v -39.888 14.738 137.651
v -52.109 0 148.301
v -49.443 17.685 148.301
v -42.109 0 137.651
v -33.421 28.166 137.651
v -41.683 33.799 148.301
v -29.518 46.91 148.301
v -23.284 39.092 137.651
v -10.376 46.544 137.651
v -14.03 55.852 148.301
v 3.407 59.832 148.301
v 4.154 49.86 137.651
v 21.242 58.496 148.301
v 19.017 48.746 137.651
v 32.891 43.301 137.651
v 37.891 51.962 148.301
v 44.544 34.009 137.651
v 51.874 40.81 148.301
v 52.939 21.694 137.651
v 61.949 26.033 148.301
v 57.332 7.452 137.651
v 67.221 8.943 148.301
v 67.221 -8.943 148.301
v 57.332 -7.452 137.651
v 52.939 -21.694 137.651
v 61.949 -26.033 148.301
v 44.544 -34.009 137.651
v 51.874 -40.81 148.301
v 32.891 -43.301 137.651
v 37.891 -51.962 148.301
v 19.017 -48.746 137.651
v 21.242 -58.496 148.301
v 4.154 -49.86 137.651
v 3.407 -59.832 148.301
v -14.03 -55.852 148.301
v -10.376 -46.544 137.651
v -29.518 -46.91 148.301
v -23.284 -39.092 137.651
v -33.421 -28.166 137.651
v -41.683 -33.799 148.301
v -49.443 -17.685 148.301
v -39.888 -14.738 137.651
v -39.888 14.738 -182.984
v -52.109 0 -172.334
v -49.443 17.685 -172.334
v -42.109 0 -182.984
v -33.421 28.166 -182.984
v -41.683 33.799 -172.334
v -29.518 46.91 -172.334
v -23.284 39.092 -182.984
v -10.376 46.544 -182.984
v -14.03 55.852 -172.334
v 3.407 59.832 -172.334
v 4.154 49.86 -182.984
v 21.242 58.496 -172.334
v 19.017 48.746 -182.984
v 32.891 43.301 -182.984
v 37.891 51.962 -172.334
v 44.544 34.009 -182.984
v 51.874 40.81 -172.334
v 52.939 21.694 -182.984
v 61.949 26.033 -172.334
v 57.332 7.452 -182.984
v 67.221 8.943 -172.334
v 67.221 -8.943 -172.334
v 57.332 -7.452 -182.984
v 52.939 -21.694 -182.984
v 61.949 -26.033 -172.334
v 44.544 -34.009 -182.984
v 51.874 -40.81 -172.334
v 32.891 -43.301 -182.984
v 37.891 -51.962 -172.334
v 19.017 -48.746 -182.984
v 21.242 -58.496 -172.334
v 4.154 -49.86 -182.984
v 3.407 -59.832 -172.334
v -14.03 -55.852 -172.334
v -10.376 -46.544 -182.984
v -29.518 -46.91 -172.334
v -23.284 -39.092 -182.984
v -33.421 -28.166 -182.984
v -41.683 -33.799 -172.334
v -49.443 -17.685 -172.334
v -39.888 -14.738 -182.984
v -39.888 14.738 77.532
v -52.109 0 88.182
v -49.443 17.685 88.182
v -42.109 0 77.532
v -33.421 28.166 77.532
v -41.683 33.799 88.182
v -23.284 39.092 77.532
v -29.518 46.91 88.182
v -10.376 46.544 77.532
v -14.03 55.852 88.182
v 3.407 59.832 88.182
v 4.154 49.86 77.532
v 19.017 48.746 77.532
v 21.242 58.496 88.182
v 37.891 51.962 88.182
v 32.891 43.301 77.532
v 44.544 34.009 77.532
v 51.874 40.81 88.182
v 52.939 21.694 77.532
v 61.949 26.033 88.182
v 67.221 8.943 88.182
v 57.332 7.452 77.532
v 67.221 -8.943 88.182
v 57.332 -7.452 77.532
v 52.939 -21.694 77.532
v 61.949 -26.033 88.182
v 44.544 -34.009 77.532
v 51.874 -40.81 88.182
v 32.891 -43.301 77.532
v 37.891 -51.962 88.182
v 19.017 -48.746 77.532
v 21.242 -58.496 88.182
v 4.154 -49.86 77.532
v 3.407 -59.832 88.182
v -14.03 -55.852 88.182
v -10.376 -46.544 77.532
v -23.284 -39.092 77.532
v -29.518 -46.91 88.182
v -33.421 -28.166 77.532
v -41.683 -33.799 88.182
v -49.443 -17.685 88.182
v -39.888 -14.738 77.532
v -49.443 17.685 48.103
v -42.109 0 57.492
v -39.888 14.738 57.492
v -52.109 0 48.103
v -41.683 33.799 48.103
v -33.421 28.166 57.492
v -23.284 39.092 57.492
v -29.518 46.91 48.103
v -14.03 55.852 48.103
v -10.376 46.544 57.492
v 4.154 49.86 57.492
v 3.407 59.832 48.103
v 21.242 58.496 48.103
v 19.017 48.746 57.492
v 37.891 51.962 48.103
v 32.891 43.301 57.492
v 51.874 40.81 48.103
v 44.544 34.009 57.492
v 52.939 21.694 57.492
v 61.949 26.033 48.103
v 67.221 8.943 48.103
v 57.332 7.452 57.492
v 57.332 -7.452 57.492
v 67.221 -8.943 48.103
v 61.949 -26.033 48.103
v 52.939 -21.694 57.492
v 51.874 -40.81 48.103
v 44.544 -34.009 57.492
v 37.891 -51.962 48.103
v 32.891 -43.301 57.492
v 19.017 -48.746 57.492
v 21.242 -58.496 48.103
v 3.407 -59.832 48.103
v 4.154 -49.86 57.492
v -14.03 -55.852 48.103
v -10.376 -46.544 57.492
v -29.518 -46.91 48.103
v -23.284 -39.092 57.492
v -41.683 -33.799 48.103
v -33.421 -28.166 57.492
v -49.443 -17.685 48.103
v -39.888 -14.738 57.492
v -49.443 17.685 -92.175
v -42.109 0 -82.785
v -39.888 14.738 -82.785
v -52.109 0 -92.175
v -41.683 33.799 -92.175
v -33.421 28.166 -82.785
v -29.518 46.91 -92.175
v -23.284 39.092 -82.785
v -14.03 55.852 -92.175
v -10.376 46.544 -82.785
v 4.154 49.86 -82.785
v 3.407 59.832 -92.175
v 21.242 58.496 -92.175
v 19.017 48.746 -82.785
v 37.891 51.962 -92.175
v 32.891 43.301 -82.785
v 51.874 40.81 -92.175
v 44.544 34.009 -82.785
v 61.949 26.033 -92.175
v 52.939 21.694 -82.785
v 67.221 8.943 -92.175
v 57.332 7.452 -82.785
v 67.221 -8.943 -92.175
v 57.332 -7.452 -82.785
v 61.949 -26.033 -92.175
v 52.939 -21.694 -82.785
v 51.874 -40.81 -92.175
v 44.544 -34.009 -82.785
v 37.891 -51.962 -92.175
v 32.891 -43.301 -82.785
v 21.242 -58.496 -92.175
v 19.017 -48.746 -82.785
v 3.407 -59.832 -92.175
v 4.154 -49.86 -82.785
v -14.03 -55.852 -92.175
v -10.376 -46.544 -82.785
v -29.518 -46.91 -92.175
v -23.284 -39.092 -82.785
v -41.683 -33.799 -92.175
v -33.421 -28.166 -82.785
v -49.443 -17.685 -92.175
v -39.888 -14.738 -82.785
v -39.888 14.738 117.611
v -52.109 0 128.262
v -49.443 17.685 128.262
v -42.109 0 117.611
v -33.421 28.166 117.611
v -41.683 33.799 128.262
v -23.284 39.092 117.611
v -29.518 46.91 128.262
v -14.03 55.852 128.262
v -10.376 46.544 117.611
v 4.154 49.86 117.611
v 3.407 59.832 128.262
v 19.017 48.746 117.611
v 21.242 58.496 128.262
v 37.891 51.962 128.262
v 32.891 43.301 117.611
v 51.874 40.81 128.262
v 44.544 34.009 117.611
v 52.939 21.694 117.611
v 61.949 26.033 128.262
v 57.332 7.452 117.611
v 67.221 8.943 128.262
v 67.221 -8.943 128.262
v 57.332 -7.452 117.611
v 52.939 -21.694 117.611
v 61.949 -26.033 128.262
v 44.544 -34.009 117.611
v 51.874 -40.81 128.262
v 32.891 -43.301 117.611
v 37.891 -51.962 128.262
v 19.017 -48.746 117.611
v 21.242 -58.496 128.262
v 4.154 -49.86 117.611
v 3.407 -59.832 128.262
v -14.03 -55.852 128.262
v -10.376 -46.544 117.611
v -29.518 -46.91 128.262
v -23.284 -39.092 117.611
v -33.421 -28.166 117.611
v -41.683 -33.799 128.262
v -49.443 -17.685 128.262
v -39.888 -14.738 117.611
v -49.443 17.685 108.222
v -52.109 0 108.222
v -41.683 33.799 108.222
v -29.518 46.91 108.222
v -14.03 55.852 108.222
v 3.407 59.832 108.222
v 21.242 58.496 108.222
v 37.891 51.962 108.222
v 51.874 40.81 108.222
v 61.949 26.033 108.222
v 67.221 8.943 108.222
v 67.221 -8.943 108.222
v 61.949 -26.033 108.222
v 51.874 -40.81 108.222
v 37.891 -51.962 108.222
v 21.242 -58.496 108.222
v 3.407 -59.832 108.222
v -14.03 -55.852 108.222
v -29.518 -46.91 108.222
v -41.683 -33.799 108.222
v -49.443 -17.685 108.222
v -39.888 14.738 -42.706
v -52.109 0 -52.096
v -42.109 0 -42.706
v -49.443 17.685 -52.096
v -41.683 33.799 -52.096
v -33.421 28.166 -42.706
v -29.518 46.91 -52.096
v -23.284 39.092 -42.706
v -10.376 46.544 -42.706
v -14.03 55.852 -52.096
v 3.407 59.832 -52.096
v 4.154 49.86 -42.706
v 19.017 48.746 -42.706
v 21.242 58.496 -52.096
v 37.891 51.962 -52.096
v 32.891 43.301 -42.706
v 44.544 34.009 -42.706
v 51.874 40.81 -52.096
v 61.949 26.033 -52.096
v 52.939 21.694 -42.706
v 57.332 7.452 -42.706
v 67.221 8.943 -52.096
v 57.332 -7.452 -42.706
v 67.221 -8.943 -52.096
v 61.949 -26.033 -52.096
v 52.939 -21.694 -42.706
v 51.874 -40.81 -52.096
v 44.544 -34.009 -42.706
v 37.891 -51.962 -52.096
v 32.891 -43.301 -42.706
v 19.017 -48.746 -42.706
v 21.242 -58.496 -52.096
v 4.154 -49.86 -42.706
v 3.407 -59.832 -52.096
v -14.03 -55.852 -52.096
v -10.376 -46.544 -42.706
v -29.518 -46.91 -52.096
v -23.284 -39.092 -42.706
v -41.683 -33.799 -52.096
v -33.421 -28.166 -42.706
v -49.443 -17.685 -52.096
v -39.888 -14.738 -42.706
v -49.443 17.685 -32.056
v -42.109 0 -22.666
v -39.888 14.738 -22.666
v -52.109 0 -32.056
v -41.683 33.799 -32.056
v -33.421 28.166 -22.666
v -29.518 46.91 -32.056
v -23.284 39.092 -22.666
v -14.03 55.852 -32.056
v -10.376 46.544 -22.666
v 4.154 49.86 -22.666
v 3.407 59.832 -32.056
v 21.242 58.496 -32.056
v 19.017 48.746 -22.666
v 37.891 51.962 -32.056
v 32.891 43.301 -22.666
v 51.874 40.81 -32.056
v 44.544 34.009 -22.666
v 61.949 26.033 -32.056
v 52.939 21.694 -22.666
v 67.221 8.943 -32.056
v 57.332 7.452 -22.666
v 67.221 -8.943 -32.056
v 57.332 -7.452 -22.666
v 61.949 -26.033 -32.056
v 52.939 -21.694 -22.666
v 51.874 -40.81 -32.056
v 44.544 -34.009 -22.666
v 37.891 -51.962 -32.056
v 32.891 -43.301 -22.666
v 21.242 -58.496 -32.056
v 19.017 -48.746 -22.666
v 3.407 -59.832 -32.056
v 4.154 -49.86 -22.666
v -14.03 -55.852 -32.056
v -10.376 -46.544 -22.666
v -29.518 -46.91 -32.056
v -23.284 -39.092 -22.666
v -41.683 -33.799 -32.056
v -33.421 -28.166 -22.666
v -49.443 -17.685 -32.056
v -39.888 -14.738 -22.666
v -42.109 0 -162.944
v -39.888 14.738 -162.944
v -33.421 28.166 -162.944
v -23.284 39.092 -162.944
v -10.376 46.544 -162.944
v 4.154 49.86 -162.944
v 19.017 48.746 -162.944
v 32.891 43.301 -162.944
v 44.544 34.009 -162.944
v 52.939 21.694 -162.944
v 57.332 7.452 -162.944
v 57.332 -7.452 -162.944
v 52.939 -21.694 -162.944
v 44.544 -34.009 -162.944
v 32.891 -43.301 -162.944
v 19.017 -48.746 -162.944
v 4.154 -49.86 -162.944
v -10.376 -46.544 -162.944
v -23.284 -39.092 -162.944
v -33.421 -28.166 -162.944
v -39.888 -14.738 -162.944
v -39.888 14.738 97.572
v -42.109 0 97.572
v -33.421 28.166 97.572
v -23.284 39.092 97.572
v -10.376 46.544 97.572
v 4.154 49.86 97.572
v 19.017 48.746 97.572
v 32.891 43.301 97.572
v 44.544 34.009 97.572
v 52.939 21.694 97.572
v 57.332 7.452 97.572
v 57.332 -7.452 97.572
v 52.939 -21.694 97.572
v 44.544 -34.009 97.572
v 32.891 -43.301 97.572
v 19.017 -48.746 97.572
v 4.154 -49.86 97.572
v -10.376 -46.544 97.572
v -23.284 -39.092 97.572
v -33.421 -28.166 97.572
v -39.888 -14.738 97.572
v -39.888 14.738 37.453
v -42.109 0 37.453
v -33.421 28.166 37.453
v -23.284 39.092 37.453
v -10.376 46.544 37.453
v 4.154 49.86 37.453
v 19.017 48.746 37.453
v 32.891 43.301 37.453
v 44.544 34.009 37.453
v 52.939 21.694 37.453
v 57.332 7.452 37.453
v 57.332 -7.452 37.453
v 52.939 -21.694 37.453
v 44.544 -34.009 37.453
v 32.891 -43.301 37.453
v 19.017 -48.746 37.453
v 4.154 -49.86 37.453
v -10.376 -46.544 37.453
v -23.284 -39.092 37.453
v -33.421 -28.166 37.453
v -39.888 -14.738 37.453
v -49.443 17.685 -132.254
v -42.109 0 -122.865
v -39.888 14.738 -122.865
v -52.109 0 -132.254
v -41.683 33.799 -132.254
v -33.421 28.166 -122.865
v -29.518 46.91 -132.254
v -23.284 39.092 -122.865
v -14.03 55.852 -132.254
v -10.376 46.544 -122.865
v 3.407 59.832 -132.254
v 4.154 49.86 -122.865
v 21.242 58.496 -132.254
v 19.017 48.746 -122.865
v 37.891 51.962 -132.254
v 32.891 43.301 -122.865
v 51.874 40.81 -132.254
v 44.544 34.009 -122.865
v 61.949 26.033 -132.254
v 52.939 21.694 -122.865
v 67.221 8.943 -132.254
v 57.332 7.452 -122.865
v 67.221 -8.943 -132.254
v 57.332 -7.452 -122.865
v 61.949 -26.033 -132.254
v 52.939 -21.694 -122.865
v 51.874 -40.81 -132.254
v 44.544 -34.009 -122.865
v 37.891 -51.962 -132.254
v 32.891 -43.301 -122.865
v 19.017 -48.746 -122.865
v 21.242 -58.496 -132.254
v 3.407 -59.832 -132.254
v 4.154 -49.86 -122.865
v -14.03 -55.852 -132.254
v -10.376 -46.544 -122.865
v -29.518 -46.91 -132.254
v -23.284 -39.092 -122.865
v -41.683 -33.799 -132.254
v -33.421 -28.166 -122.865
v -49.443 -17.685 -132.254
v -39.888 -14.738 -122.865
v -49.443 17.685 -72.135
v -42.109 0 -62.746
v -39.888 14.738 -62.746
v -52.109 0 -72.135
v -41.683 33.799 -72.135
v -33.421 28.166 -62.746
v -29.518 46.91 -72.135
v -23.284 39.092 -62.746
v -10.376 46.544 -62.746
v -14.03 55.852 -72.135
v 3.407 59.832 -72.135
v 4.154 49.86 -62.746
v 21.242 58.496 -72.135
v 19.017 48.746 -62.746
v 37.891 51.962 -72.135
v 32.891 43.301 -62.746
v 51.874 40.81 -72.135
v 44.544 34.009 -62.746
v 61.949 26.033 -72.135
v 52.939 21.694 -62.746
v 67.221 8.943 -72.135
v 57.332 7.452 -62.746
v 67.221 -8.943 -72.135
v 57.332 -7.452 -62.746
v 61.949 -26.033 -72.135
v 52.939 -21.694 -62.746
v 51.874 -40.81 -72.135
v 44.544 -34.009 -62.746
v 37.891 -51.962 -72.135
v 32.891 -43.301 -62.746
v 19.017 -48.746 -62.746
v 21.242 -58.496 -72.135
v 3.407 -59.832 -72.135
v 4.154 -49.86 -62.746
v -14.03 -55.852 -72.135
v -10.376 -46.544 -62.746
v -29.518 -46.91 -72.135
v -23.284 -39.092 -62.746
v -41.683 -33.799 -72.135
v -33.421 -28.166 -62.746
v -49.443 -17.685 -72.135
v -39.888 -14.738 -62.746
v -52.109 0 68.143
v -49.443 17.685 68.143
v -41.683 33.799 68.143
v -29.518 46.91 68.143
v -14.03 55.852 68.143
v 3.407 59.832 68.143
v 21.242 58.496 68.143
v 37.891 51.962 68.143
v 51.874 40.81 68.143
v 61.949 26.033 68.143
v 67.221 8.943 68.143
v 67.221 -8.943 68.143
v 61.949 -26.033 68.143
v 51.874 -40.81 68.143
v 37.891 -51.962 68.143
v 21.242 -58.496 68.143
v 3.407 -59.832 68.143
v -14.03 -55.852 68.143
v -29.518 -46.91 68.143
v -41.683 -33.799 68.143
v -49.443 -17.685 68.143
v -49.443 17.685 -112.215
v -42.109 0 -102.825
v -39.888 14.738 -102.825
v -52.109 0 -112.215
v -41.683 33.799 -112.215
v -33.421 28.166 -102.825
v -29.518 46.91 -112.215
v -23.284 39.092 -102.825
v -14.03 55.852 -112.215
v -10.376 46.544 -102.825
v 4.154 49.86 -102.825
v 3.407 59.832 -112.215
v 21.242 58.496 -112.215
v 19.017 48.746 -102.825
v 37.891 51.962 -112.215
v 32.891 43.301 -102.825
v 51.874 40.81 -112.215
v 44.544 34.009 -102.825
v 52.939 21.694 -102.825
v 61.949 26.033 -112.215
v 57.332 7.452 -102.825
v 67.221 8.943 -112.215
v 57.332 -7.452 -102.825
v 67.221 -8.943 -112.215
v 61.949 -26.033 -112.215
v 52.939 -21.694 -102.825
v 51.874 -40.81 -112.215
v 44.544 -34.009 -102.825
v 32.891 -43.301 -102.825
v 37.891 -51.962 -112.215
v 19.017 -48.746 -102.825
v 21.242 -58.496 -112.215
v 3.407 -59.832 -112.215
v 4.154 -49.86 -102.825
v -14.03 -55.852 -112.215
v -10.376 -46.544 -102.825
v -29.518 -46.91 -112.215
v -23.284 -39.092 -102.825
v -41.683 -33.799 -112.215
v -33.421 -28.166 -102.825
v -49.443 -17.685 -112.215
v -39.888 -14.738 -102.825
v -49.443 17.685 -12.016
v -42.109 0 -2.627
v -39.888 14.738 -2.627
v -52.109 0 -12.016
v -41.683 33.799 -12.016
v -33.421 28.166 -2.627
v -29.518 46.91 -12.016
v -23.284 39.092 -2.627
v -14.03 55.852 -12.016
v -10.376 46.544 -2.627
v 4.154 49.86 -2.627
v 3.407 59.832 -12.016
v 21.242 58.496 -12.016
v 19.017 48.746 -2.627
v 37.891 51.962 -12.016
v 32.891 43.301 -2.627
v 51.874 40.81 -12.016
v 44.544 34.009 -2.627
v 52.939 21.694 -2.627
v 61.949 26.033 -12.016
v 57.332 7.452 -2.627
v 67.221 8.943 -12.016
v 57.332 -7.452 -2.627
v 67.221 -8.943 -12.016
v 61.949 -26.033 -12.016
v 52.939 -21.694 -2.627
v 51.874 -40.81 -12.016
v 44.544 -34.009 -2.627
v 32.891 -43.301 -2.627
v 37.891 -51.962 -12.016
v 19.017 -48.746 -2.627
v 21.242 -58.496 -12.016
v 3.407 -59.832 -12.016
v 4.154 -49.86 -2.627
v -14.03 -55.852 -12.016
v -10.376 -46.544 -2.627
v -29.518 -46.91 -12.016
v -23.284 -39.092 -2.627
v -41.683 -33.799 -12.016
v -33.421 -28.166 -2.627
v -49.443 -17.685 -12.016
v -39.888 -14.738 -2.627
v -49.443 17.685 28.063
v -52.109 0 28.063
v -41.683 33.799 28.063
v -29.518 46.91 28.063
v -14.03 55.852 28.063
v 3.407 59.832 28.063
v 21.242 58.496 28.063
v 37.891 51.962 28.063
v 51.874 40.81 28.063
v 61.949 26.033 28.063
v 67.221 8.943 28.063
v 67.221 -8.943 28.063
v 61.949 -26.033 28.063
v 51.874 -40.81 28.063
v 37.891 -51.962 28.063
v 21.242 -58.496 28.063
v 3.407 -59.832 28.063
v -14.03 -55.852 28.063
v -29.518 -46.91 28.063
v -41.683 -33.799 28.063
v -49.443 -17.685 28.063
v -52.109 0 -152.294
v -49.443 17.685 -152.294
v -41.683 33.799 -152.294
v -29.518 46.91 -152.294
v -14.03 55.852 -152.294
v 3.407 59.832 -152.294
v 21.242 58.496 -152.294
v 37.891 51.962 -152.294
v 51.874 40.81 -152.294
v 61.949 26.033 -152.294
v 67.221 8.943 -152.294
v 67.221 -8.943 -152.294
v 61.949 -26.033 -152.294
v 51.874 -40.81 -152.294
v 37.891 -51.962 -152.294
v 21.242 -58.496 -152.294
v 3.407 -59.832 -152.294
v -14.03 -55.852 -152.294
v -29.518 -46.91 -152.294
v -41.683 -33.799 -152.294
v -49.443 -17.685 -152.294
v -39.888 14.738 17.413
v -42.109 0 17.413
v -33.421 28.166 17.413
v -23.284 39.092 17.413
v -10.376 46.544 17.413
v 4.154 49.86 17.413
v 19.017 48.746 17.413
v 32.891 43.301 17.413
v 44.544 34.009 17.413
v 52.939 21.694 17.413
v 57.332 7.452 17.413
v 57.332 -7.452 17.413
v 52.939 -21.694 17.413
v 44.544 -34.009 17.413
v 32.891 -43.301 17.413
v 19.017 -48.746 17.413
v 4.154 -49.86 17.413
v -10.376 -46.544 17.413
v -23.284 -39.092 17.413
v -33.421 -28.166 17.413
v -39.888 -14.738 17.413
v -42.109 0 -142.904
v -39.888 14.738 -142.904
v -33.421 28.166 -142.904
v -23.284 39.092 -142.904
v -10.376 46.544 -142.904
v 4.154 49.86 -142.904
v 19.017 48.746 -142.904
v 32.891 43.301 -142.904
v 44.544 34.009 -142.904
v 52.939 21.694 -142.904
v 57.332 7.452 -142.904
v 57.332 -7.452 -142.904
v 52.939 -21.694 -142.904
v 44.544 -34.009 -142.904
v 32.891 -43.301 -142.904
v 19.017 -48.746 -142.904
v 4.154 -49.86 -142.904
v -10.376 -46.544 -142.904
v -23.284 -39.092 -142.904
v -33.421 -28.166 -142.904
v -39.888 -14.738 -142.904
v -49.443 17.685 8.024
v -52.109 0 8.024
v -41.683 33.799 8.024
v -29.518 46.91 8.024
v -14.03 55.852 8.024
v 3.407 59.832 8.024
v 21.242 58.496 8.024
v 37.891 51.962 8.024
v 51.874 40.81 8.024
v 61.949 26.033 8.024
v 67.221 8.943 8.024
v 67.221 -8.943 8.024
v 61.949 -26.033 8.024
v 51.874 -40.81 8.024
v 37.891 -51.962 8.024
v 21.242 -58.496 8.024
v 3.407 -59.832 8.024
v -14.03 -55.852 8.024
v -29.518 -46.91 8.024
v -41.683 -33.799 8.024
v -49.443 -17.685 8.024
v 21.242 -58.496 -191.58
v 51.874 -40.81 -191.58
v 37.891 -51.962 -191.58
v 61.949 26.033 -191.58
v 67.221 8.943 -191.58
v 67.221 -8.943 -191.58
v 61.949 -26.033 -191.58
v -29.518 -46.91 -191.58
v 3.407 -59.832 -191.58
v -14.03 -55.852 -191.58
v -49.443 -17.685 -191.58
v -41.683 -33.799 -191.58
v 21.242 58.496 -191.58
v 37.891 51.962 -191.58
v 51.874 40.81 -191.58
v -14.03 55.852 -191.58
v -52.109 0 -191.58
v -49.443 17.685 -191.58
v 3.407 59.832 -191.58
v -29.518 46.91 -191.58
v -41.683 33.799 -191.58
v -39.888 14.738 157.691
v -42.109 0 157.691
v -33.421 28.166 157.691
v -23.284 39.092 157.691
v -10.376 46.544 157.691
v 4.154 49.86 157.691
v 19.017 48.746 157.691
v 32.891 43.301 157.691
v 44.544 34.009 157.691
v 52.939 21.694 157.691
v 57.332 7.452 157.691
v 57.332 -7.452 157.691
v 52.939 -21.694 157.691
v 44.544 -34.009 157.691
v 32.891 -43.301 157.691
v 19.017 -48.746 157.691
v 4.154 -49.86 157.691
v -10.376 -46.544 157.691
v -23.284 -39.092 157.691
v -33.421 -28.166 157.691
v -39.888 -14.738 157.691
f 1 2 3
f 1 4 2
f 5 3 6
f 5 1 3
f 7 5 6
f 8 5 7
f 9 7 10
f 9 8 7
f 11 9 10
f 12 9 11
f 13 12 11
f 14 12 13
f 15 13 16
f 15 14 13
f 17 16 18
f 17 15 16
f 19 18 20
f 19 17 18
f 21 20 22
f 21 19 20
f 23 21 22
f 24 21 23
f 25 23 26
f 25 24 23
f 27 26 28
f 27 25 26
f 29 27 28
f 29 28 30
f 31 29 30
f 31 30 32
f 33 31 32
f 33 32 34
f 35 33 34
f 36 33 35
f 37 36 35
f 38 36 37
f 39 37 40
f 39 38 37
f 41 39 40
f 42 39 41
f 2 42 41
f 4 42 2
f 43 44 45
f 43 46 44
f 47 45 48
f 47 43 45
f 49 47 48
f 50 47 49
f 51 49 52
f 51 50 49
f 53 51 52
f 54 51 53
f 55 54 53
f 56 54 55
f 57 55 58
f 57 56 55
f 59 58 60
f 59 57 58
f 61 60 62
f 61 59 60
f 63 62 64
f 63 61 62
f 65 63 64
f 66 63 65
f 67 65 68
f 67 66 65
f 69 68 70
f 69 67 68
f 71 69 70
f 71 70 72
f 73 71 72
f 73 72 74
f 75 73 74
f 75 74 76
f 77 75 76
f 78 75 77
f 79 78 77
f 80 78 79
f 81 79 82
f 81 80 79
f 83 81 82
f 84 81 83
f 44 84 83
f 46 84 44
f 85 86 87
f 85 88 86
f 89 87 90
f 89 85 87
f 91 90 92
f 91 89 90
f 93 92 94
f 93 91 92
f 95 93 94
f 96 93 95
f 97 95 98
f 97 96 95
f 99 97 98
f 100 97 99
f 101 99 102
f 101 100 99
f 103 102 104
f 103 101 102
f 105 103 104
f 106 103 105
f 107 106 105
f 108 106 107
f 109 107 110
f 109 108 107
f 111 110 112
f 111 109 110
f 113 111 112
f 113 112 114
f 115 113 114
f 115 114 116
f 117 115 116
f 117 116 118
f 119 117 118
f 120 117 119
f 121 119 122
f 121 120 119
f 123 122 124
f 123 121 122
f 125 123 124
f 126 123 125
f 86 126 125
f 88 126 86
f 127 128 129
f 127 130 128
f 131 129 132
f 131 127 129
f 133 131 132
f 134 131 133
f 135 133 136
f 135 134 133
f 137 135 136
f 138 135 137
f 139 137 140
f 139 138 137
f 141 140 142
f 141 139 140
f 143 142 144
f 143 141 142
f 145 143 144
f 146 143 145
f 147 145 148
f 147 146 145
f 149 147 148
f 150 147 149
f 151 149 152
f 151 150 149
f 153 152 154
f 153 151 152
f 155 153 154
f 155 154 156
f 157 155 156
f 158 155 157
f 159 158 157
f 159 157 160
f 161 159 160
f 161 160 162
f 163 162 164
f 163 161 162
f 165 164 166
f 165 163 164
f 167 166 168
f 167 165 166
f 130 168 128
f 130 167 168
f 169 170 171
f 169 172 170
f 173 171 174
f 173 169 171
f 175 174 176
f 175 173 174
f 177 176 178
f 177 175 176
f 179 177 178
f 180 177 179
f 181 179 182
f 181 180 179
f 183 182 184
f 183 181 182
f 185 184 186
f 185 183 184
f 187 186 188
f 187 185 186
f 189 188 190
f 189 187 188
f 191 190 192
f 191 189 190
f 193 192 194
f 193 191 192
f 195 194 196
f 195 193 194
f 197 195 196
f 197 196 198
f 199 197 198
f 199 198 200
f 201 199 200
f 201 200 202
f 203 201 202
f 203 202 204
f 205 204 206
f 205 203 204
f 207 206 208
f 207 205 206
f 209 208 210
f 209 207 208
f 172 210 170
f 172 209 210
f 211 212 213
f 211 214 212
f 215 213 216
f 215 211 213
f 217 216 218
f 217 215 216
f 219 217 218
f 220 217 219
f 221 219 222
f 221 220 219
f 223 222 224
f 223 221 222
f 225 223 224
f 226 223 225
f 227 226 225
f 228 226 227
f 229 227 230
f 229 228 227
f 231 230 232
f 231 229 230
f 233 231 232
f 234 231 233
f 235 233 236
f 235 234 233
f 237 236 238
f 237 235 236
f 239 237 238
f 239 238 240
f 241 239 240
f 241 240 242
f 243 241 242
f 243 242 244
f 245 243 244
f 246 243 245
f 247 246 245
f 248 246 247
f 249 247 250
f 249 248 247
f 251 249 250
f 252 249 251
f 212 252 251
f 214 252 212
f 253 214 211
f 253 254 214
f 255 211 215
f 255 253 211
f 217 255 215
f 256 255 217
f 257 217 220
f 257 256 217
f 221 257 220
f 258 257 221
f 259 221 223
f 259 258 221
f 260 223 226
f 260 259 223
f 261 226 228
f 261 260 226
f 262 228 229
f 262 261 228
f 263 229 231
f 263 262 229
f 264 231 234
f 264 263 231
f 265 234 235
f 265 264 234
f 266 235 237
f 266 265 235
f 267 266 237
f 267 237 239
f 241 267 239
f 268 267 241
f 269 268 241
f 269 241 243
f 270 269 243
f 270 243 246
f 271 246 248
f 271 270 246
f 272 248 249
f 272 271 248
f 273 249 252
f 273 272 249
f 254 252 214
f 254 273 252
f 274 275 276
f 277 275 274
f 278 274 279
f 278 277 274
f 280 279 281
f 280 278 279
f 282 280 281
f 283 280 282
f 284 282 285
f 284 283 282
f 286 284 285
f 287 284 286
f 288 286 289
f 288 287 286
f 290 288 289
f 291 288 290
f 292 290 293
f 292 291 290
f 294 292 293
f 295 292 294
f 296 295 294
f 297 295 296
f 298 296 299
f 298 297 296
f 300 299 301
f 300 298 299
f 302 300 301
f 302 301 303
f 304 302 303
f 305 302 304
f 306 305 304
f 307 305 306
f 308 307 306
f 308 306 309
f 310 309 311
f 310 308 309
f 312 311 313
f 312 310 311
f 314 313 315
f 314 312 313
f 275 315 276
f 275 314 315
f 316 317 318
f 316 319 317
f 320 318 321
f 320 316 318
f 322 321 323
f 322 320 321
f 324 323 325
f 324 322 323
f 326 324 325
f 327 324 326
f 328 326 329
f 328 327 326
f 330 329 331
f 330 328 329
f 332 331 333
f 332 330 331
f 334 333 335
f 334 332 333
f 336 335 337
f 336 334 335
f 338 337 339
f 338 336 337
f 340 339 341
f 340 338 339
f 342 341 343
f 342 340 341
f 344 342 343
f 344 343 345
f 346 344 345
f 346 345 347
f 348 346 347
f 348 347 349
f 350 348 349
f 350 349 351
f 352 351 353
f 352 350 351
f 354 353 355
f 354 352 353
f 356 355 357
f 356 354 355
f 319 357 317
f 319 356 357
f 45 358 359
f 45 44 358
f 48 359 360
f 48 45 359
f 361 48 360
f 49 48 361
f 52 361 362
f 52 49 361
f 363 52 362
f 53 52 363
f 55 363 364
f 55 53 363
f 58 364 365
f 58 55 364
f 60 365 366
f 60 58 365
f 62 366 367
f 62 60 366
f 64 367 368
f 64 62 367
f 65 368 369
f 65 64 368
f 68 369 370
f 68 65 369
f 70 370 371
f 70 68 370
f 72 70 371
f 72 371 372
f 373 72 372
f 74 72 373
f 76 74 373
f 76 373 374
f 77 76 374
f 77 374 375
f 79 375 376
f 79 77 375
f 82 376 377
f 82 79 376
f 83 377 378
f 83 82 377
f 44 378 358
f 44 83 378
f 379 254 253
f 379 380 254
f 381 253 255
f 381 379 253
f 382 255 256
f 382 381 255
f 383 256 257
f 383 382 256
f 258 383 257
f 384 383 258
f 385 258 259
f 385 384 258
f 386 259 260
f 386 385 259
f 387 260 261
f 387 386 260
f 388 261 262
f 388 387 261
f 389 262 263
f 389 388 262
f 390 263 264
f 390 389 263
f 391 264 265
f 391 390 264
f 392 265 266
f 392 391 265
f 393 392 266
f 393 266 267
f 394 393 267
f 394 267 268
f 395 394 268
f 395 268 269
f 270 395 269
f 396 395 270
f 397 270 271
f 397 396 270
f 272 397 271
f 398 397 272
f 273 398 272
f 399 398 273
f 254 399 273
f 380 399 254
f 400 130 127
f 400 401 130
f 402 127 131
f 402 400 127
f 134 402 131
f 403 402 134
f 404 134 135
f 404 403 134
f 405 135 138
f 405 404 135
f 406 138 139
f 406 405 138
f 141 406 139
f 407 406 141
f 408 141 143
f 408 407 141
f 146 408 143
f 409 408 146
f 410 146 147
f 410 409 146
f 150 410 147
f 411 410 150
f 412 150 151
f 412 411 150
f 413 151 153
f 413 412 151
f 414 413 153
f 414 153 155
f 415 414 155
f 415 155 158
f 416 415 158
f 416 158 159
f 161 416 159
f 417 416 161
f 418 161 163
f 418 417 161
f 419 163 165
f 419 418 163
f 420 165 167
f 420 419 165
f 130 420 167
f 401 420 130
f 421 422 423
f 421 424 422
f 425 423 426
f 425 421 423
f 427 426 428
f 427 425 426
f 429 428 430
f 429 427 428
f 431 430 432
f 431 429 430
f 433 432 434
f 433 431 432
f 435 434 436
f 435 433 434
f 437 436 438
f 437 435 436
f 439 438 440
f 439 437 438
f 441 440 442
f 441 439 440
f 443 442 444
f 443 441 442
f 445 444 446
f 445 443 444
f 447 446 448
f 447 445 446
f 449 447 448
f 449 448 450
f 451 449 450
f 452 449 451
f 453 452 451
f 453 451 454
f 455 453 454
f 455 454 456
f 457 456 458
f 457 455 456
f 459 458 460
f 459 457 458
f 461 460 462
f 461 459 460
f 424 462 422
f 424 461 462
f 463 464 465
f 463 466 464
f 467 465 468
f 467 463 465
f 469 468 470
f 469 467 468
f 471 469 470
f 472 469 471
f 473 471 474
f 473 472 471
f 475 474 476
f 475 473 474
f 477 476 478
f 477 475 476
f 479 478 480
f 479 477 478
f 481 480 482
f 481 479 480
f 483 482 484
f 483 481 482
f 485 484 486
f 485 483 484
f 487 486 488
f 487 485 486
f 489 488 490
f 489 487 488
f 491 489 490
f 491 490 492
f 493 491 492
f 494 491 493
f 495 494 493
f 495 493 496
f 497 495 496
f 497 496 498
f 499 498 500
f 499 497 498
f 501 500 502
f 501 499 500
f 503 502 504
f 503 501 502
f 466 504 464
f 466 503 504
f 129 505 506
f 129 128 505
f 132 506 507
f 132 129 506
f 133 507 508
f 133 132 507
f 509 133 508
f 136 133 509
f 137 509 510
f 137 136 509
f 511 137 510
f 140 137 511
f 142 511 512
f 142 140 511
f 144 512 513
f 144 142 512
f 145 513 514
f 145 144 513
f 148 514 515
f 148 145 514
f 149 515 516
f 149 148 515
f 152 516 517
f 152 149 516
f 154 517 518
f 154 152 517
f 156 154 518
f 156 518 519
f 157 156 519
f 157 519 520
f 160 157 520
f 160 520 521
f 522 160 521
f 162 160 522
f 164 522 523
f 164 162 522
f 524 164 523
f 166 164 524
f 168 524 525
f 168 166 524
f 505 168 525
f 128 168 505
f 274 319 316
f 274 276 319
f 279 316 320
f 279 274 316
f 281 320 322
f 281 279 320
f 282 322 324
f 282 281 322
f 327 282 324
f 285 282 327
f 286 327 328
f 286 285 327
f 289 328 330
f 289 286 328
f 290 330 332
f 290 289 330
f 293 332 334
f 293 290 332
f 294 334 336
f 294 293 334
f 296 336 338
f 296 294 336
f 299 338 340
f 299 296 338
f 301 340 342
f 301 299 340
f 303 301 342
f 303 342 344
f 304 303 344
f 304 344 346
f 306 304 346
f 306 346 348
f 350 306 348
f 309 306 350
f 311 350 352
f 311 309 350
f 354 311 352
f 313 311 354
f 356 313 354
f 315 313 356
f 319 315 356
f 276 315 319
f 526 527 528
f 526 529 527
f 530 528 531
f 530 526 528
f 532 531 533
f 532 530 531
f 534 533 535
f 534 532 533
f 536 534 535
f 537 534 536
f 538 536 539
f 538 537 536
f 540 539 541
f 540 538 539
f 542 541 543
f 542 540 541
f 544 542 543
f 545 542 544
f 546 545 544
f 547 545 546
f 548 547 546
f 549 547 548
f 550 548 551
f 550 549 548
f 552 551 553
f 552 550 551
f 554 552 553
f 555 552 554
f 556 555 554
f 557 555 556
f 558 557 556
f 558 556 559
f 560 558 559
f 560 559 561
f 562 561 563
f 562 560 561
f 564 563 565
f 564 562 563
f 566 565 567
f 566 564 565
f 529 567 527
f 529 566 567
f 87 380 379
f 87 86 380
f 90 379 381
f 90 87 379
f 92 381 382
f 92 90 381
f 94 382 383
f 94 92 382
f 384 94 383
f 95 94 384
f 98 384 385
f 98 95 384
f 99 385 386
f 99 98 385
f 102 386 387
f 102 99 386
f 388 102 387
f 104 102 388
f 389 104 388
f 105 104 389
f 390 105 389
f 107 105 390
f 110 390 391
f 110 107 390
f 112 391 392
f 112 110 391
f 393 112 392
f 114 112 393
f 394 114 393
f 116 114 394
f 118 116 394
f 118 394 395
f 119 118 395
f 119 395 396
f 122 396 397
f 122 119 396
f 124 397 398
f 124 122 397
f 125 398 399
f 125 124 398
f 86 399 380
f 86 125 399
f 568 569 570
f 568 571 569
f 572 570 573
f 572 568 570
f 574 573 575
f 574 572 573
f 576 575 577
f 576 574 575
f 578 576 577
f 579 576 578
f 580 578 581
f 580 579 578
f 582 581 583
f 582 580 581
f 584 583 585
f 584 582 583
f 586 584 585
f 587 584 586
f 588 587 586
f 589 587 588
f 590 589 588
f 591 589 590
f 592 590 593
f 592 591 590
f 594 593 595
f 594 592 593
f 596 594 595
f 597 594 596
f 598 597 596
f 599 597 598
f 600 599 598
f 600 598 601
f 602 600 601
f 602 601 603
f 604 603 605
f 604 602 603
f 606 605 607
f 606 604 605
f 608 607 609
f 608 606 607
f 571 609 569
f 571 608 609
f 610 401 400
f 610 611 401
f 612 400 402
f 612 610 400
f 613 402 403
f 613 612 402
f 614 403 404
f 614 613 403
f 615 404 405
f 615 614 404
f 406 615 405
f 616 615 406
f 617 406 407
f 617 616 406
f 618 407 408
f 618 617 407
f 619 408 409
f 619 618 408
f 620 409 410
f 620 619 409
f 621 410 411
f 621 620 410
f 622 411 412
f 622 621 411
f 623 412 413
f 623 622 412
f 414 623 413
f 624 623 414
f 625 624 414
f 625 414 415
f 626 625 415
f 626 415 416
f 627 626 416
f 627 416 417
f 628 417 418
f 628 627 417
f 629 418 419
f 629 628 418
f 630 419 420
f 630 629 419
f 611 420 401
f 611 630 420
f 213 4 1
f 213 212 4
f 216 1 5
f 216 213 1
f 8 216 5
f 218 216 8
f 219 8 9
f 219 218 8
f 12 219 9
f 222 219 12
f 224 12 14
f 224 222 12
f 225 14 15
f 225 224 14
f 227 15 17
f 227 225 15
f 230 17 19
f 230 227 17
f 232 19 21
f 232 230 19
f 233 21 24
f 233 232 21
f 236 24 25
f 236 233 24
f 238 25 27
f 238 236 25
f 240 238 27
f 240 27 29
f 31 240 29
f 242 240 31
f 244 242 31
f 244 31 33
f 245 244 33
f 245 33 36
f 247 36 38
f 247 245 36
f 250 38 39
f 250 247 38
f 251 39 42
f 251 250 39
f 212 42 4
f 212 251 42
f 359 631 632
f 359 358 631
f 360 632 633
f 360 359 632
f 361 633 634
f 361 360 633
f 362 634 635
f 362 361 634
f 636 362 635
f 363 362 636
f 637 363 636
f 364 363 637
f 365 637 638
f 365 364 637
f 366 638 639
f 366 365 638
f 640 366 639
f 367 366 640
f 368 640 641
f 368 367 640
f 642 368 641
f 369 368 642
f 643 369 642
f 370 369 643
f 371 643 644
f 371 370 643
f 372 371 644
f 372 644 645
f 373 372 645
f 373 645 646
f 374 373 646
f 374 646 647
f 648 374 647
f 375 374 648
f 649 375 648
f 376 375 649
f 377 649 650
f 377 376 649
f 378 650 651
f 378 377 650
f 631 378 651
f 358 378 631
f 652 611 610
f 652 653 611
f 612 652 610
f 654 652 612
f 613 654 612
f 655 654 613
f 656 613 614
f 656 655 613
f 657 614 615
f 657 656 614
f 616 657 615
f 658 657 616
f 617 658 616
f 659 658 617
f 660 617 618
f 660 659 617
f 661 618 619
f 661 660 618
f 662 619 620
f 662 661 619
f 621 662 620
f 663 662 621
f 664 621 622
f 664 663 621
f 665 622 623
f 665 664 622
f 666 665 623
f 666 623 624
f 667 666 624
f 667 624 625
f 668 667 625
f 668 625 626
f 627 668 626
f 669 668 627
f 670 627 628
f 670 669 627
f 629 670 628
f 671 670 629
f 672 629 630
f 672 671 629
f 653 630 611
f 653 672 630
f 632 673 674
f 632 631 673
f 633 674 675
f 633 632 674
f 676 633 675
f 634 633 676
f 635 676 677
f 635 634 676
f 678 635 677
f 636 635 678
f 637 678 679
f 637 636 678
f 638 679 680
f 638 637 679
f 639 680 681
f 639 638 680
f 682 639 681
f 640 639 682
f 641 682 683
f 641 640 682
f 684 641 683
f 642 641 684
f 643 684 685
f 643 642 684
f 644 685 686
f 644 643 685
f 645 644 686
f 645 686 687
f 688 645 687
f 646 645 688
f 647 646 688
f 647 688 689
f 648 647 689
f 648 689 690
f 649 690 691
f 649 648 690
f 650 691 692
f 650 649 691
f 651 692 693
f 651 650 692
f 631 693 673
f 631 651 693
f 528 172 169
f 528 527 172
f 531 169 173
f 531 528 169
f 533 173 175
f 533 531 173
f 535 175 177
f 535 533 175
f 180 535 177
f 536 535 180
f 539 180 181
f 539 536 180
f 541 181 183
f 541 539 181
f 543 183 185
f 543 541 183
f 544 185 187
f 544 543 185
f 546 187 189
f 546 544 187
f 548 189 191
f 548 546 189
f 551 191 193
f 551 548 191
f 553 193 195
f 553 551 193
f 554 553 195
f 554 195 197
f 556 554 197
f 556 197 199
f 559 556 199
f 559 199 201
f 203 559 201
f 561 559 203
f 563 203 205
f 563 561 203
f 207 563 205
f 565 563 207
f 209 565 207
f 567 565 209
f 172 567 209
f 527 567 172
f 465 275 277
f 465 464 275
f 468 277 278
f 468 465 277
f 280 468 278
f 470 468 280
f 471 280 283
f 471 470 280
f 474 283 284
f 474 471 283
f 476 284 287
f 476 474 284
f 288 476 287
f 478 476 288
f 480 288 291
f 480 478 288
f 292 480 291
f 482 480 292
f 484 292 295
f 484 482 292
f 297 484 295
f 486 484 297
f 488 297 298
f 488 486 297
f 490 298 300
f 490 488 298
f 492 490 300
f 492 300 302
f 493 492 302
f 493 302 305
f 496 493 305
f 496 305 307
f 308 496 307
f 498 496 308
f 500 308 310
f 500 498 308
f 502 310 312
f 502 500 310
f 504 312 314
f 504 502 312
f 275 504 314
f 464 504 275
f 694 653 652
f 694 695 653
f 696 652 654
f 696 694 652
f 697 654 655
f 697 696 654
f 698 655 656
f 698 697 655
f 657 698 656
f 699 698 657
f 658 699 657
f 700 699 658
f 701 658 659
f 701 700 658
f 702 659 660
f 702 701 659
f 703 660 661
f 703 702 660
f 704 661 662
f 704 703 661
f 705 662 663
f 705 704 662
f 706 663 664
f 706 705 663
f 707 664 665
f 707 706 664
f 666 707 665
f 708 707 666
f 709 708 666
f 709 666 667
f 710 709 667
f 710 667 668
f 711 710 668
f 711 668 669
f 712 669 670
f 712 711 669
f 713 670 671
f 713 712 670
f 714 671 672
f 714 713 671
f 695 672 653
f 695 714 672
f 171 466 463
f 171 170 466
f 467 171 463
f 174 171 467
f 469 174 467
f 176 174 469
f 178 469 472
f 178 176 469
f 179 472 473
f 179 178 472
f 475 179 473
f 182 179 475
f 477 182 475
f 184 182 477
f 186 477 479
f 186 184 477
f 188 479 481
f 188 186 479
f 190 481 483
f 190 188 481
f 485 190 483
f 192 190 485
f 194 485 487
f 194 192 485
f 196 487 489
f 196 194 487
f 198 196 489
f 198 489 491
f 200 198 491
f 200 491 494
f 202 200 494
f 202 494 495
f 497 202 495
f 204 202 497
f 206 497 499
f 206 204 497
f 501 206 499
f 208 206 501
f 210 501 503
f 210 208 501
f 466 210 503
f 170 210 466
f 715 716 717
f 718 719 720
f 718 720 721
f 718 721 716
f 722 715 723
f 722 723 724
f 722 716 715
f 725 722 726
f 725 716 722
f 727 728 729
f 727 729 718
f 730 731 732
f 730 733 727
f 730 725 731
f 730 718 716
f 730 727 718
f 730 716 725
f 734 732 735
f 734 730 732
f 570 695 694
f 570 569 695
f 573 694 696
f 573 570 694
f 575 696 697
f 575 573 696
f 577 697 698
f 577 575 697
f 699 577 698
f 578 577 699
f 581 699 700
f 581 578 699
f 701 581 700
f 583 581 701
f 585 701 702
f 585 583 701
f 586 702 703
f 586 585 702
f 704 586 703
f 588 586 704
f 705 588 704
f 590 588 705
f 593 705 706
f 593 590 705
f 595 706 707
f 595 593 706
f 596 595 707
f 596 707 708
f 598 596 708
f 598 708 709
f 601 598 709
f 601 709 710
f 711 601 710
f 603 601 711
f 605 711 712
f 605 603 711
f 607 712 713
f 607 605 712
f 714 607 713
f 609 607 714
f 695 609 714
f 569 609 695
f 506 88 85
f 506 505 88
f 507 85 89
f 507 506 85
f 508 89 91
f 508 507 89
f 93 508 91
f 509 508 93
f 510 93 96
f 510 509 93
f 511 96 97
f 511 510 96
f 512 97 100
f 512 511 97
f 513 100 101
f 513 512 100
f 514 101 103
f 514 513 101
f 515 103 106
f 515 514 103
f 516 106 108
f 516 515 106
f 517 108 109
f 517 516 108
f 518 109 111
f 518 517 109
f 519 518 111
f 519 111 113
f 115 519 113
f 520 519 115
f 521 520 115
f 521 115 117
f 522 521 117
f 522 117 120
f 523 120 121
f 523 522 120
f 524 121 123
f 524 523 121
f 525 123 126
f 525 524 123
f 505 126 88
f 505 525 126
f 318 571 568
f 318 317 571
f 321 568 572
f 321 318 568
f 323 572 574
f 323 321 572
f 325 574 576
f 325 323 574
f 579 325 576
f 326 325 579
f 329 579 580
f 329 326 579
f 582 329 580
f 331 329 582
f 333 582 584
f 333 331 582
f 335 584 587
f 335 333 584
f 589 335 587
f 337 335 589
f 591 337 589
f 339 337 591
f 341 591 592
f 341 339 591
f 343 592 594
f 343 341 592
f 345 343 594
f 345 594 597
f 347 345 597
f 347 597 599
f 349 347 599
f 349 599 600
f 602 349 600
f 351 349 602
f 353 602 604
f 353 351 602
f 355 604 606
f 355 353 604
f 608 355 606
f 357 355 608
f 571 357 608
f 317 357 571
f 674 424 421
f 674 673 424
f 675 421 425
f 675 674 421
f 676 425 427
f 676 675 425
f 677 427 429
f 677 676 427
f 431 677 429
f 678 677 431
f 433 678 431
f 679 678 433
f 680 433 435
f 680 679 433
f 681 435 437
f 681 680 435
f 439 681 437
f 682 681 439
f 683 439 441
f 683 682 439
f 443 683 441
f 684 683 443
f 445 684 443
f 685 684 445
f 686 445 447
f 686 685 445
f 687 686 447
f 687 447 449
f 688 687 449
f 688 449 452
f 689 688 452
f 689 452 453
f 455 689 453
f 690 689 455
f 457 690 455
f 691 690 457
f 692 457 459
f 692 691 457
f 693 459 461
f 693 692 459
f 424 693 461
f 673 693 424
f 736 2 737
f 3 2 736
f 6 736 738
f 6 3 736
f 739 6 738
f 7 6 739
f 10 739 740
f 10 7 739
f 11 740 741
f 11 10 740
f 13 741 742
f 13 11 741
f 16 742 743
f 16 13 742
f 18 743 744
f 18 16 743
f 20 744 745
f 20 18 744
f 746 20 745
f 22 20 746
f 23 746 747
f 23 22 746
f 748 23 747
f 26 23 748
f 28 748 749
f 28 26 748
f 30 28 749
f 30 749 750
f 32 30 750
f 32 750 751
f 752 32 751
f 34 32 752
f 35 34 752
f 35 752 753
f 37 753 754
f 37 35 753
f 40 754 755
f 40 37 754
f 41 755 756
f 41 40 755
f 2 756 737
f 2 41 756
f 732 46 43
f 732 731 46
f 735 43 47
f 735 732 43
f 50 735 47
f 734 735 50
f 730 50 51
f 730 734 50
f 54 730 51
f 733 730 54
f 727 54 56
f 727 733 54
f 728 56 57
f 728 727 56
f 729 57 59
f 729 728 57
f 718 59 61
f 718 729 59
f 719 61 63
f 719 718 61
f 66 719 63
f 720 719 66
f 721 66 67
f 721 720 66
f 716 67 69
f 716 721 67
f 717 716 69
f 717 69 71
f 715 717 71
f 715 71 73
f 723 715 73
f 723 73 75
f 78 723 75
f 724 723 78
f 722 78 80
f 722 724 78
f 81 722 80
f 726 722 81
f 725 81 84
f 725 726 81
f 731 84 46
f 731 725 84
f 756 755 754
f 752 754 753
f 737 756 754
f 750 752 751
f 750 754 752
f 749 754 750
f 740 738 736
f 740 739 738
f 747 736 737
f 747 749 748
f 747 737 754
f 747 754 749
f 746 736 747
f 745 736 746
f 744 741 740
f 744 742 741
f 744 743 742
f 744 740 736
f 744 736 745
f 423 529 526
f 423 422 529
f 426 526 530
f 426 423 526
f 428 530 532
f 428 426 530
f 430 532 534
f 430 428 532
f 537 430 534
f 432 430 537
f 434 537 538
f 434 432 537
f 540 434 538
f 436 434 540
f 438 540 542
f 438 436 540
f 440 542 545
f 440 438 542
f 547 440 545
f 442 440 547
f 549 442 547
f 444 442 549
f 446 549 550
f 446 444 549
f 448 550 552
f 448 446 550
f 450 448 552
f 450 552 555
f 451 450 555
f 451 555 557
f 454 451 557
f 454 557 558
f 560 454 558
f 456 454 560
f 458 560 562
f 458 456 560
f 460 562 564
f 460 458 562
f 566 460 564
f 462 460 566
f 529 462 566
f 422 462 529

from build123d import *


with BuildPart() as f1:
    # F0 (on Front) → F1 (revolve)
    with BuildSketch(Plane.XZ):
        Polygon((7.89093, 157.690874), (-42.10907, 157.690874), (-52.10907, 148.301338), (-42.10907, 137.651184), (-52.10907, 128.261649), (-42.10907, 117.611494), (-52.10907, 108.221959), (-42.10907, 97.571805), (-52.10907, 88.182269), (-42.10907, 77.532115), (-52.10907, 68.14258), (-42.10907, 57.492426), (-52.10907, 48.10289), (-42.10907, 37.452736), (-52.10907, 28.063201), (-42.10907, 17.413046), (-52.10907, 8.023511), (-42.10907, -2.626643), (-52.10907, -12.016179), (-42.10907, -22.666333), (-52.10907, -32.055868), (-42.10907, -42.706022), (-52.10907, -52.095558), (-42.10907, -62.745712), (-52.10907, -72.135247), (-42.10907, -82.785402), (-52.10907, -92.174937), (-42.10907, -102.825091), (-52.10907, -112.214627), (-42.10907, -122.864781), (-52.10907, -132.254316), (-42.10907, -142.90447), (-52.10907, -152.294006), (-42.10907, -162.94416), (-52.10907, -172.333695), (-42.10907, -182.983849), (-52.10907, -191.579593), (7.89093, -191.579593), align=None)
    revolve(axis=Axis((7.89093, 0, -16.94436), (0, 0, -1)))


solid = f1.part
